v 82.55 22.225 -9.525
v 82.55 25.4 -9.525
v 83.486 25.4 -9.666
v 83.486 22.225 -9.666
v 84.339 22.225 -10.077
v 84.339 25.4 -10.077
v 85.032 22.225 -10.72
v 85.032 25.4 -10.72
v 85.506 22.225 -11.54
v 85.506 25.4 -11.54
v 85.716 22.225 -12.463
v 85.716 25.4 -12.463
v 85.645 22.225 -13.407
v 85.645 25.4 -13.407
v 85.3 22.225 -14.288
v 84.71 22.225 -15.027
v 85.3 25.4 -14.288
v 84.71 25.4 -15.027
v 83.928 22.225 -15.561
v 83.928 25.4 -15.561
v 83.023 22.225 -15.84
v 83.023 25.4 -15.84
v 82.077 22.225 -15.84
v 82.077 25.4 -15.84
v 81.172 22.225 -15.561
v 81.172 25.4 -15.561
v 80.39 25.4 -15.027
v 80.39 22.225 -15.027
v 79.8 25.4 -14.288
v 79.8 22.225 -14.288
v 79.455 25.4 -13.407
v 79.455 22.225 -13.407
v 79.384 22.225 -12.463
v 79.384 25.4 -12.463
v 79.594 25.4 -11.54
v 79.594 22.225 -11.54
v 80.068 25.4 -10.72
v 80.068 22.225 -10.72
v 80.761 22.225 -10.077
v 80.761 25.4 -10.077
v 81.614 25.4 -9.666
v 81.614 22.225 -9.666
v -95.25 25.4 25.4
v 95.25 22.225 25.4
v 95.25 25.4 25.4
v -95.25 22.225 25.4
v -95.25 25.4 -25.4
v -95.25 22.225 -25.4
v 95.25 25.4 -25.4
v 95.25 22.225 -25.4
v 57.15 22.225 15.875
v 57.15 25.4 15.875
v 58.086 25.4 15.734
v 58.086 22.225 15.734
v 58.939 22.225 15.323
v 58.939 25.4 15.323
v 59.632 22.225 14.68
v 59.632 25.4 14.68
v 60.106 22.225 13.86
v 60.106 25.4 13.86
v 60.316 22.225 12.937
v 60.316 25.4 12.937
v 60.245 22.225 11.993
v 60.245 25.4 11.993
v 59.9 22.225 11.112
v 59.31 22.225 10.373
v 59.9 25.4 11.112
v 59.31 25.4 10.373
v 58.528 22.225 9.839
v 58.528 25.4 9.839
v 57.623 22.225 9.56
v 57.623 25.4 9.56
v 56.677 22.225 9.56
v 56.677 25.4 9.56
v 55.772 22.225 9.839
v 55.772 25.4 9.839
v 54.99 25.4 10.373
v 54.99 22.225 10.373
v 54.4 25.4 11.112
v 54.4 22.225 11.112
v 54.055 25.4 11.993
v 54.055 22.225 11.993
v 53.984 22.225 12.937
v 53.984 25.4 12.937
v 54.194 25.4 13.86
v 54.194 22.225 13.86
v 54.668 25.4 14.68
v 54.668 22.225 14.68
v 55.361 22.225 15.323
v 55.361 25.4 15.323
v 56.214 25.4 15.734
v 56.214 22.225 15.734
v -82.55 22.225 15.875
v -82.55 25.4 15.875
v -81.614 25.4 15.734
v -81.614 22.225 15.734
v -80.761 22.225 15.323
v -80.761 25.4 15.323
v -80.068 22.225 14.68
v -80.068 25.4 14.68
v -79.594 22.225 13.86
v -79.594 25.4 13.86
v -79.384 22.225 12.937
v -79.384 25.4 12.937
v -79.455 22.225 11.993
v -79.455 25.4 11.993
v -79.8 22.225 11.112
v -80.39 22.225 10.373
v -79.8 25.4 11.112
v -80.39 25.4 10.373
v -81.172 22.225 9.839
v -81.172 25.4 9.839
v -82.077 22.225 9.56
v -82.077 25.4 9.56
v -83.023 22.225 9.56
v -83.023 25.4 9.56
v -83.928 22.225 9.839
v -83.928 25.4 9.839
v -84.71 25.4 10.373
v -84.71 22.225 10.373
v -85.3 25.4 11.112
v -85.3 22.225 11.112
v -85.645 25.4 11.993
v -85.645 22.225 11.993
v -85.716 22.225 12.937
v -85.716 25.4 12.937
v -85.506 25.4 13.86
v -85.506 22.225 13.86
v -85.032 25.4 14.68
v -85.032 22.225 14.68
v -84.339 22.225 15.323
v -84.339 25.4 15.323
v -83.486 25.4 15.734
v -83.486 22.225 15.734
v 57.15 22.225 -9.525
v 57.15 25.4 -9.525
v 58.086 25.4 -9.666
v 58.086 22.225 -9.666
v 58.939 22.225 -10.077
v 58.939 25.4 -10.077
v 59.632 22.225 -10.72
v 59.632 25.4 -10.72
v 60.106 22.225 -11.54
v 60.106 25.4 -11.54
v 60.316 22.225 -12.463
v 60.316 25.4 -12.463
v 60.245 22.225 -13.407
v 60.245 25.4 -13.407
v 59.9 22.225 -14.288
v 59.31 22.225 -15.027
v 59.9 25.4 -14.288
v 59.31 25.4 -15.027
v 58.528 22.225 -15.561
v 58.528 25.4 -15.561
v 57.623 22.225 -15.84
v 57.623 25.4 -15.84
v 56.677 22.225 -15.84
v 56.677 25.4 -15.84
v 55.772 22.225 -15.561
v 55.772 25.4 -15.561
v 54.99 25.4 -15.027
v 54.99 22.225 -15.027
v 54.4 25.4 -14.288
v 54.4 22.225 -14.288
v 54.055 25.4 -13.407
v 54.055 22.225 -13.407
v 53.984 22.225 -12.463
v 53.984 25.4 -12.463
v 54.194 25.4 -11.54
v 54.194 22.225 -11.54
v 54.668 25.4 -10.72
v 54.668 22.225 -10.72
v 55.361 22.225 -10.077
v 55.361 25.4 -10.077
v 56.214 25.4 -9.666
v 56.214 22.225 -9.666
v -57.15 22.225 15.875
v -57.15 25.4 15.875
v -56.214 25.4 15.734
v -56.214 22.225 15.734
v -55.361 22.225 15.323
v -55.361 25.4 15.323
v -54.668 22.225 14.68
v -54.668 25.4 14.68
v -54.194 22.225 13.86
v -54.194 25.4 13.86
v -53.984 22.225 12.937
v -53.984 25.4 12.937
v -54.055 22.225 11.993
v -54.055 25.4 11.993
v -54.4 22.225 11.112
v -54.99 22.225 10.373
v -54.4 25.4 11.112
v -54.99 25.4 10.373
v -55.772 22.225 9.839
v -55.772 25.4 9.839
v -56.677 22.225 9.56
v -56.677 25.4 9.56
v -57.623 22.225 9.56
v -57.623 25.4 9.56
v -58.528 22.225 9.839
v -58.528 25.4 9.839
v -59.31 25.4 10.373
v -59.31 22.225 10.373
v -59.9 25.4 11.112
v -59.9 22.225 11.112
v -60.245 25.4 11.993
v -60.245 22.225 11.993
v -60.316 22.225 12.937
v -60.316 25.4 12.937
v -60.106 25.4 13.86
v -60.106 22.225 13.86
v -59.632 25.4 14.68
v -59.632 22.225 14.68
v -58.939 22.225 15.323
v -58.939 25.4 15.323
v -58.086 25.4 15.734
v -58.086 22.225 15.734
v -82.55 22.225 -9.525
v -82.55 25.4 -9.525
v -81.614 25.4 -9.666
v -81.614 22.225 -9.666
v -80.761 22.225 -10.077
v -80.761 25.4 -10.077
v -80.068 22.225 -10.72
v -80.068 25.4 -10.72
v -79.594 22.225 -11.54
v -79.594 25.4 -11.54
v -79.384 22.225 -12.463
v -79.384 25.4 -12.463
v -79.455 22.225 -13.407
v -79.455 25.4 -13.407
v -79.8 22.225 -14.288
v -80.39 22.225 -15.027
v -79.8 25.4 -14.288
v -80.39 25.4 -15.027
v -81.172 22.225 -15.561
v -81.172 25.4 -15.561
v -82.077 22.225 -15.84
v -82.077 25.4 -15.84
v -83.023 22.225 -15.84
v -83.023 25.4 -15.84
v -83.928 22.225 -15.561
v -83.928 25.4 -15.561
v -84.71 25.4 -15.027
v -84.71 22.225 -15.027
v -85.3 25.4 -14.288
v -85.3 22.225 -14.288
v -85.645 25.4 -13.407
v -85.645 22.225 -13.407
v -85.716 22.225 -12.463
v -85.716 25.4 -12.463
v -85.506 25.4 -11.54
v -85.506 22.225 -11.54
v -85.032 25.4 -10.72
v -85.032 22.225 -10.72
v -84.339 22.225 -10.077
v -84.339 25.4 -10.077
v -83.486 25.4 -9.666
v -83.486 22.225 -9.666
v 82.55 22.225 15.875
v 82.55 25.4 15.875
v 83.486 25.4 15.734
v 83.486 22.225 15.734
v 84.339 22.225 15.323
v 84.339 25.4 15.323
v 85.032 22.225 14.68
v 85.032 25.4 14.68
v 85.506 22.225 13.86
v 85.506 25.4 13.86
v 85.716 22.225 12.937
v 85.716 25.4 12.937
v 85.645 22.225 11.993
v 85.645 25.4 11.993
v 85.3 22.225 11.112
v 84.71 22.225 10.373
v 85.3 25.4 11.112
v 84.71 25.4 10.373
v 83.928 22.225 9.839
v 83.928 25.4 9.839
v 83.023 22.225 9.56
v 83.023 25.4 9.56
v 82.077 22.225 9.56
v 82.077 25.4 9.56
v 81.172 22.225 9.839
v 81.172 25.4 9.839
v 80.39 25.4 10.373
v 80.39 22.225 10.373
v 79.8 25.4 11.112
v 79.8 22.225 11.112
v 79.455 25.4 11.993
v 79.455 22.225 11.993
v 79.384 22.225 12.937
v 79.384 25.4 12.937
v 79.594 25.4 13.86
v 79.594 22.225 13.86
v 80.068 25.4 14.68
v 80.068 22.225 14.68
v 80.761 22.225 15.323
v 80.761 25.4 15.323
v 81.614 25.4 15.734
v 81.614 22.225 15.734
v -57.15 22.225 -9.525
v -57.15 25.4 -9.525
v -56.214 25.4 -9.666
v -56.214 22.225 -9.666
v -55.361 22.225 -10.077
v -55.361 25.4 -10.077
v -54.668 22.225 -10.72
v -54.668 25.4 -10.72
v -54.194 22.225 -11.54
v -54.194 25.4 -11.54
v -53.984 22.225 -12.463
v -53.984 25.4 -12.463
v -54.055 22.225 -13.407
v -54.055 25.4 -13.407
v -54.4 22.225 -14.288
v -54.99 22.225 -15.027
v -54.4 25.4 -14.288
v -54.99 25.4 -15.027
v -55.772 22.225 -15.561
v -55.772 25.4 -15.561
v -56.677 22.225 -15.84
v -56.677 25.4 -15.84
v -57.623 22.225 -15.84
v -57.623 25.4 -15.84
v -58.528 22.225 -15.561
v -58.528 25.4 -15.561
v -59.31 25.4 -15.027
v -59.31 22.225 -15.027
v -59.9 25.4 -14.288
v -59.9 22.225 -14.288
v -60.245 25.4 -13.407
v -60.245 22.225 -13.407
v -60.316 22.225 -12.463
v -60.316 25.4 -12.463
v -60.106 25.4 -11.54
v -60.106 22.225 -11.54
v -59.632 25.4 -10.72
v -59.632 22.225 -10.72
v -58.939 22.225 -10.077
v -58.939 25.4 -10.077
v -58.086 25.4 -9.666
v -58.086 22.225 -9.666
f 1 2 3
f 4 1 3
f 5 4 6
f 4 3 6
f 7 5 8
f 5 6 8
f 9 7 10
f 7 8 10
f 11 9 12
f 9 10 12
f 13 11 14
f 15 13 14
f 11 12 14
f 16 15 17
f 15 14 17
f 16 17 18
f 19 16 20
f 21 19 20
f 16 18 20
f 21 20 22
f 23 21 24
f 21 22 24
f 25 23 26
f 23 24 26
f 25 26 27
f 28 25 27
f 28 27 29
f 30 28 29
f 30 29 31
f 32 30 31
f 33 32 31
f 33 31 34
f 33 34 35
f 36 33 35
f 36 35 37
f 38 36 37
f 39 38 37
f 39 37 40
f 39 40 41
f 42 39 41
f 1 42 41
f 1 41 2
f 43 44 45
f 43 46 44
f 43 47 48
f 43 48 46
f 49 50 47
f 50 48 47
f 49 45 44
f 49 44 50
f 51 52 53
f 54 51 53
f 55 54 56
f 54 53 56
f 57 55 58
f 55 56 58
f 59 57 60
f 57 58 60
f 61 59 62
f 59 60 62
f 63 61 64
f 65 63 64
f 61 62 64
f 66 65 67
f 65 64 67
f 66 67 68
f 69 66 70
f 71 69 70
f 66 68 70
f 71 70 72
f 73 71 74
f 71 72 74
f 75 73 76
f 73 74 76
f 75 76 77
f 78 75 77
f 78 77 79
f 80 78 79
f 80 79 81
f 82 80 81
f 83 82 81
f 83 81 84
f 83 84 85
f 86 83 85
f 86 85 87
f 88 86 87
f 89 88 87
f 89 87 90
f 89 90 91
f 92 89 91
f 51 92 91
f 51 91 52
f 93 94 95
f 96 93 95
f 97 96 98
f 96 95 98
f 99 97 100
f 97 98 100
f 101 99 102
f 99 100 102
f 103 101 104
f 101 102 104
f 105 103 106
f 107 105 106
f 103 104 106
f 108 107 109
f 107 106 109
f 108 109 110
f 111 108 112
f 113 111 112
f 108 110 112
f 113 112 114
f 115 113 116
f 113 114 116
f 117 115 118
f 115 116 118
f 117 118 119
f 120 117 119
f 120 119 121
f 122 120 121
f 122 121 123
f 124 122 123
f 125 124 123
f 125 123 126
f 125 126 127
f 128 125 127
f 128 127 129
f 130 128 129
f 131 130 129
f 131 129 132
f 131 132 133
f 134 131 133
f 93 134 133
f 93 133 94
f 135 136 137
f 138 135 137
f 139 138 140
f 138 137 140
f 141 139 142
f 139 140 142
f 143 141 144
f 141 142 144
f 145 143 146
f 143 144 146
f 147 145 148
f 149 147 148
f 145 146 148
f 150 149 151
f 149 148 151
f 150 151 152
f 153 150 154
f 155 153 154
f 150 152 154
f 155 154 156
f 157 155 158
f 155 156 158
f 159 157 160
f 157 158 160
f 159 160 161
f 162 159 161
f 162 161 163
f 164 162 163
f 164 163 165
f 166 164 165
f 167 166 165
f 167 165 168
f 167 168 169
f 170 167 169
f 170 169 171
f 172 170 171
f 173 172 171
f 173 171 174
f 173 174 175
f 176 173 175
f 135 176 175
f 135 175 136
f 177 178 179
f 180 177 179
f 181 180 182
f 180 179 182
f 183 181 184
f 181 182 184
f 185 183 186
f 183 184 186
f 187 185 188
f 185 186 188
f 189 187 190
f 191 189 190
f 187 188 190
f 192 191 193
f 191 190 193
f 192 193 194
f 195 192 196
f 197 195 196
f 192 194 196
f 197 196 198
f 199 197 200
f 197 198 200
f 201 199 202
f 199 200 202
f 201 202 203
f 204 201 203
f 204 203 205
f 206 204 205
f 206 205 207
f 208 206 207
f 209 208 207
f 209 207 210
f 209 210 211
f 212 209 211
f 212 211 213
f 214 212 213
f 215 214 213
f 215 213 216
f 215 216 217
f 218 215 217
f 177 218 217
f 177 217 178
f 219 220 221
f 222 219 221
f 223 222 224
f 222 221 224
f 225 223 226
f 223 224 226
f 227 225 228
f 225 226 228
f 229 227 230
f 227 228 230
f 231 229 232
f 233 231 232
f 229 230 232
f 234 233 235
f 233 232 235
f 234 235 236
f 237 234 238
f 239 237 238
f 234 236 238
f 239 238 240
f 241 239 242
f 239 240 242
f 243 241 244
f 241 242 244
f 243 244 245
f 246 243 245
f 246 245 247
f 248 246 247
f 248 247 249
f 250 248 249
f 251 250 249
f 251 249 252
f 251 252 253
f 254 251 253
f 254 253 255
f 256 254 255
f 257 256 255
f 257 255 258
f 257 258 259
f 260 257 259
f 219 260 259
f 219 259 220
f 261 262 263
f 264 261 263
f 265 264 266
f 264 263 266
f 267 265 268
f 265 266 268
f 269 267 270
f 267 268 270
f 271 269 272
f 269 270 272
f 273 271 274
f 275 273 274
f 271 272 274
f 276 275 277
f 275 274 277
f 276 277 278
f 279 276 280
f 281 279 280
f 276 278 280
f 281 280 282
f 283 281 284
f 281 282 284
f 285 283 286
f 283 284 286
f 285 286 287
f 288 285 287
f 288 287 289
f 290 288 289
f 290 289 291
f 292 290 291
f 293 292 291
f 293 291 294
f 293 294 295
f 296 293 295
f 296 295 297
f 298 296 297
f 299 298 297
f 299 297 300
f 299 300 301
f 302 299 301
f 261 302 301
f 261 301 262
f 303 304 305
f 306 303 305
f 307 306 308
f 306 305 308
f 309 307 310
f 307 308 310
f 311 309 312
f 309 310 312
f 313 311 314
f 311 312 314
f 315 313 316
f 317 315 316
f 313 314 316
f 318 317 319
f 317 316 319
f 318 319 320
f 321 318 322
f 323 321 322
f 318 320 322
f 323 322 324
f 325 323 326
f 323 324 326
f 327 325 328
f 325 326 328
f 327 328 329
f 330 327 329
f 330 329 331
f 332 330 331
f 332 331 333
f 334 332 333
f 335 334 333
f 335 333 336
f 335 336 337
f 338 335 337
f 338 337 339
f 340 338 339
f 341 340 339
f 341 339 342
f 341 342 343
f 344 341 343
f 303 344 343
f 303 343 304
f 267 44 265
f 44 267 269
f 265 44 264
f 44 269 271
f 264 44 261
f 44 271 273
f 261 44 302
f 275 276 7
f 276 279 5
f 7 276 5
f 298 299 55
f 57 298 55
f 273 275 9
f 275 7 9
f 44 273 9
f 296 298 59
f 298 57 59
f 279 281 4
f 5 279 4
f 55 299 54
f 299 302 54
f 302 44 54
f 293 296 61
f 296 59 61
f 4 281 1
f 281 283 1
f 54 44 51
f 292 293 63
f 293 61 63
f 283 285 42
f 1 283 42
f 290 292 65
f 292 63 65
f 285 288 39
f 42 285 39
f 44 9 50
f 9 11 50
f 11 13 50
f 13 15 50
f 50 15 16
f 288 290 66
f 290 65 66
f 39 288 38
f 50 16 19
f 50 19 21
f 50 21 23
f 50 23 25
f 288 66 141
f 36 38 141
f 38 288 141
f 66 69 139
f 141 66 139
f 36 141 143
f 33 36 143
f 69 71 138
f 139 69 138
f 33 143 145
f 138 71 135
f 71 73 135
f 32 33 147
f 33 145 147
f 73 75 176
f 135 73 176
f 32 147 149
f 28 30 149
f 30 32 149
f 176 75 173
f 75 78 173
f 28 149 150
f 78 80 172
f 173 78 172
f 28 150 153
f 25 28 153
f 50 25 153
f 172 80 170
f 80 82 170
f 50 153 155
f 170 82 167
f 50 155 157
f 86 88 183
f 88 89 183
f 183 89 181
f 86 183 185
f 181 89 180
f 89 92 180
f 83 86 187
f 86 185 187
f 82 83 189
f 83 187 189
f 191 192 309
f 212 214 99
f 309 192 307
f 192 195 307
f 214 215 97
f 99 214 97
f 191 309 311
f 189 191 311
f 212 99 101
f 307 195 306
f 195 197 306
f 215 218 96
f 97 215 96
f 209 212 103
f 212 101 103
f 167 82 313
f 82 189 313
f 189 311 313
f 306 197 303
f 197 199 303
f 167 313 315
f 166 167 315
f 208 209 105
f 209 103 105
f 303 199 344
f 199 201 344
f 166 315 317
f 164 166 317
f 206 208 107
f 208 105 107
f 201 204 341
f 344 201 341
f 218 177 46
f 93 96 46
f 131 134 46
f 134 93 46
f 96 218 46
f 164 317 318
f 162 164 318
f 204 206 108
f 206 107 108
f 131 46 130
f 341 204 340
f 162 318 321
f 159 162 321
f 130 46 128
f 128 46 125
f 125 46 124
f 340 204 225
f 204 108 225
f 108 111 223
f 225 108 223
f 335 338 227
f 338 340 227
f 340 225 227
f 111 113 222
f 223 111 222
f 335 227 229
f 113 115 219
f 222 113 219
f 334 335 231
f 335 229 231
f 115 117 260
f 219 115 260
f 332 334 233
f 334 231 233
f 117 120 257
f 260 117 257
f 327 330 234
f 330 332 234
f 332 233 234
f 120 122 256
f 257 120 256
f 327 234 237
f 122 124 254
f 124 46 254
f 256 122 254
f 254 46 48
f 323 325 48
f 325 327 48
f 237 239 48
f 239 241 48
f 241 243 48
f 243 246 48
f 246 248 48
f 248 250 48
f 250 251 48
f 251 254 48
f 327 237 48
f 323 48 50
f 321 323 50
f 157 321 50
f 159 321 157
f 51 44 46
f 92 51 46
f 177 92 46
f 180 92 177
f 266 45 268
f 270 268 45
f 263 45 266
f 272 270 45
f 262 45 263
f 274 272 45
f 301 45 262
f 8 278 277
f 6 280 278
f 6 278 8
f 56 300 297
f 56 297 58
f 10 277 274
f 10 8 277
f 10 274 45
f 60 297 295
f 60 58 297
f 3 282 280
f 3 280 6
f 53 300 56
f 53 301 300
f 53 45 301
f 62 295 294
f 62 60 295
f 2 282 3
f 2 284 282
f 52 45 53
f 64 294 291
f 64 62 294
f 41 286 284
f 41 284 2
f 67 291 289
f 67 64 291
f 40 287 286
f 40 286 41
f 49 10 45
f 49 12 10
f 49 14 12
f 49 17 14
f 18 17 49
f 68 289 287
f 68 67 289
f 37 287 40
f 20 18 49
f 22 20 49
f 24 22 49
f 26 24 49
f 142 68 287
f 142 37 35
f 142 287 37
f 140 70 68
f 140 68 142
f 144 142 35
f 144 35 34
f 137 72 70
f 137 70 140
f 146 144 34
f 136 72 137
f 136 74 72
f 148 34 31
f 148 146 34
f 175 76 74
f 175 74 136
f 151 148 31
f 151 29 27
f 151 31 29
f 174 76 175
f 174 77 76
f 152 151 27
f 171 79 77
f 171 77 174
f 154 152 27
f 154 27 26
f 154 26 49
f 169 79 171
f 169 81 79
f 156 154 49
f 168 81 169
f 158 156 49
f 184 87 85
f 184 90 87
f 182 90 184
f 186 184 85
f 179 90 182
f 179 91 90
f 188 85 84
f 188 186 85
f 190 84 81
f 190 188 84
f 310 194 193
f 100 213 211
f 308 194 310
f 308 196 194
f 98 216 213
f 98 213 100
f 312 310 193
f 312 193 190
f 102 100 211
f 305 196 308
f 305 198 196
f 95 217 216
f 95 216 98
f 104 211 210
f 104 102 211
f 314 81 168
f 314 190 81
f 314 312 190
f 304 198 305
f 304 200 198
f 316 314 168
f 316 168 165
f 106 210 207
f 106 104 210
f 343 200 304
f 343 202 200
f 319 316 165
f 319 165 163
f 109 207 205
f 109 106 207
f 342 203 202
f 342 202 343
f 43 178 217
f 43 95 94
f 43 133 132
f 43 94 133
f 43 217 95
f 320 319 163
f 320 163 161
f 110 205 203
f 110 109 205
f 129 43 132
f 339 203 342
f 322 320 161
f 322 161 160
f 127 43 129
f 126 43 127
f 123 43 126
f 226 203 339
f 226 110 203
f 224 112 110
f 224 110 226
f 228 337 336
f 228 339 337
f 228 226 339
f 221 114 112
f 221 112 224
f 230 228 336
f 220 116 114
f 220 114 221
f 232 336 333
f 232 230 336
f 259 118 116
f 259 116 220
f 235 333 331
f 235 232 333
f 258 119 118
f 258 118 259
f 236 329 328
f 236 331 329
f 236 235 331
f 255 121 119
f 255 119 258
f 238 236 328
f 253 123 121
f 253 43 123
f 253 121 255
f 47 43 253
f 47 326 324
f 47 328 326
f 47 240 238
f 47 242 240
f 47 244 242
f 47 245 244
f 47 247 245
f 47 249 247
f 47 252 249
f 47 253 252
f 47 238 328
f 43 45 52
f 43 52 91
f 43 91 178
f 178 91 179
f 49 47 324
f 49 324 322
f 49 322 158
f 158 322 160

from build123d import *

# Parameters (mm, degrees)
SKETCH1_W           = 139.7
SKETCH1_H           = 50.8
BOSS_EXTRUDE1_DEPTH = 25.4
CUT_EXTRUDE1_REACH  = 146.244
SKETCH2_W           = 50.8
SKETCH2_H           = 22.225
SKETCH3_R           = 3.175
CUT_EXTRUDE2_DEPTH  = 75.392628163
SKETCH5_W           = 50.8
SKETCH5_H           = 3.175
BOSS_EXTRUDE2_DEPTH = 25.4
SKETCH7_W           = 50.8
SKETCH7_H           = 3.175
BOSS_EXTRUDE3_DEPTH = 25.4
CUT_EXTRUDE3_REACH  = 100.63
SKETCH8_R           = 3.175


with BuildPart() as part:
    # Sketch1 → Boss-Extrude1 (new body)
    with BuildSketch(Plane(origin=(0, 0, 0), x_dir=(1, 0, 0), z_dir=(0, 1, 0))):
        Rectangle(SKETCH1_W, SKETCH1_H)
    extrude(amount=BOSS_EXTRUDE1_DEPTH)

    # Sketch2 → Cut-Extrude1 (cut, up to next)
    with BuildSketch(Plane.ZY.offset(69.85), mode=Mode.PRIVATE) as cut_extrude1_sk1:
        with Locations((0, 11.1125)):
            Rectangle(SKETCH2_W, SKETCH2_H)
    cut_extrude1_tool1 = extrude(cut_extrude1_sk1.sketch, amount=-CUT_EXTRUDE1_REACH, mode=Mode.PRIVATE) & part.part
    add(cut_extrude1_tool1.solids().sort_by_distance((-69.85, 11.1125, 0))[0], mode=Mode.SUBTRACT)

    # Sketch3 → Cut-Extrude2 (cut, through all)
    with BuildSketch(Plane(origin=(0, 25.4, 0), x_dir=(1, 0, 0), z_dir=(0, 1, 0))):
        with Locations(Location((-57.15, 12.7, 0), (0, 0, 270))):
            Circle(SKETCH3_R)
        with Locations(Location((-57.15, -12.7, 0), (0, 0, 270))):
            Circle(SKETCH3_R)
        with Locations(Location((57.15, -12.7, 0), (0, 0, 270))):
            Circle(SKETCH3_R)
        with Locations(Location((57.15, 12.7, 0), (0, 0, 270))):
            Circle(SKETCH3_R)
    extrude(amount=-CUT_EXTRUDE2_DEPTH, mode=Mode.SUBTRACT)

    # Sketch5 → Boss-Extrude2 (add)
    with BuildSketch(Plane.ZY.offset(69.85)):
        with Locations((0, 23.8125)):
            Rectangle(SKETCH5_W, SKETCH5_H)
    extrude(amount=BOSS_EXTRUDE2_DEPTH)

    # Sketch7 → Boss-Extrude3 (add)
    with BuildSketch(Plane(origin=(69.85, 0, 0), x_dir=(0, 0, -1), z_dir=(1, 0, 0))):
        with Locations((0, 23.8125)):
            Rectangle(SKETCH7_W, SKETCH7_H)
    extrude(amount=BOSS_EXTRUDE3_DEPTH)

    # Sketch8 → Cut-Extrude3 (cut, up to next)
    with BuildSketch(Plane(origin=(0, 25.4, 0), x_dir=(1, 0, 0), z_dir=(0, 1, 0)), mode=Mode.PRIVATE) as cut_extrude3_sk1:
        with Locations(Location((-82.55, 12.7, 0), (0, 0, 270))):
            Circle(SKETCH8_R)
    cut_extrude3_tool1 = extrude(cut_extrude3_sk1.sketch, amount=-CUT_EXTRUDE3_REACH, mode=Mode.PRIVATE) & part.part
    # Sketch8 → Cut-Extrude3 (cut, up to next)
    with BuildSketch(Plane(origin=(0, 25.4, 0), x_dir=(1, 0, 0), z_dir=(0, 1, 0)), mode=Mode.PRIVATE) as cut_extrude3_sk2:
        with Locations(Location((-82.55, -12.7, 0), (0, 0, 270))):
            Circle(SKETCH8_R)
    cut_extrude3_tool2 = extrude(cut_extrude3_sk2.sketch, amount=-CUT_EXTRUDE3_REACH, mode=Mode.PRIVATE) & part.part
    # Sketch8 → Cut-Extrude3 (cut, up to next)
    with BuildSketch(Plane(origin=(0, 25.4, 0), x_dir=(1, 0, 0), z_dir=(0, 1, 0)), mode=Mode.PRIVATE) as cut_extrude3_sk3:
        with Locations(Location((82.55, -12.7, 0), (0, 0, 270))):
            Circle(SKETCH8_R)
    cut_extrude3_tool3 = extrude(cut_extrude3_sk3.sketch, amount=-CUT_EXTRUDE3_REACH, mode=Mode.PRIVATE) & part.part
    # Sketch8 → Cut-Extrude3 (cut, up to next)
    with BuildSketch(Plane(origin=(0, 25.4, 0), x_dir=(1, 0, 0), z_dir=(0, 1, 0)), mode=Mode.PRIVATE) as cut_extrude3_sk4:
        with Locations(Location((82.55, 12.7, 0), (0, 0, 270))):
            Circle(SKETCH8_R)
    cut_extrude3_tool4 = extrude(cut_extrude3_sk4.sketch, amount=-CUT_EXTRUDE3_REACH, mode=Mode.PRIVATE) & part.part
    add(cut_extrude3_tool1.solids().sort_by_distance((-82.55, 25.4, -12.7))[0], mode=Mode.SUBTRACT)
    add(cut_extrude3_tool2.solids().sort_by_distance((-82.55, 25.4, 12.7))[0], mode=Mode.SUBTRACT)
    add(cut_extrude3_tool3.solids().sort_by_distance((82.55, 25.4, 12.7))[0], mode=Mode.SUBTRACT)
    add(cut_extrude3_tool4.solids().sort_by_distance((82.55, 25.4, -12.7))[0], mode=Mode.SUBTRACT)


solid = part.part
